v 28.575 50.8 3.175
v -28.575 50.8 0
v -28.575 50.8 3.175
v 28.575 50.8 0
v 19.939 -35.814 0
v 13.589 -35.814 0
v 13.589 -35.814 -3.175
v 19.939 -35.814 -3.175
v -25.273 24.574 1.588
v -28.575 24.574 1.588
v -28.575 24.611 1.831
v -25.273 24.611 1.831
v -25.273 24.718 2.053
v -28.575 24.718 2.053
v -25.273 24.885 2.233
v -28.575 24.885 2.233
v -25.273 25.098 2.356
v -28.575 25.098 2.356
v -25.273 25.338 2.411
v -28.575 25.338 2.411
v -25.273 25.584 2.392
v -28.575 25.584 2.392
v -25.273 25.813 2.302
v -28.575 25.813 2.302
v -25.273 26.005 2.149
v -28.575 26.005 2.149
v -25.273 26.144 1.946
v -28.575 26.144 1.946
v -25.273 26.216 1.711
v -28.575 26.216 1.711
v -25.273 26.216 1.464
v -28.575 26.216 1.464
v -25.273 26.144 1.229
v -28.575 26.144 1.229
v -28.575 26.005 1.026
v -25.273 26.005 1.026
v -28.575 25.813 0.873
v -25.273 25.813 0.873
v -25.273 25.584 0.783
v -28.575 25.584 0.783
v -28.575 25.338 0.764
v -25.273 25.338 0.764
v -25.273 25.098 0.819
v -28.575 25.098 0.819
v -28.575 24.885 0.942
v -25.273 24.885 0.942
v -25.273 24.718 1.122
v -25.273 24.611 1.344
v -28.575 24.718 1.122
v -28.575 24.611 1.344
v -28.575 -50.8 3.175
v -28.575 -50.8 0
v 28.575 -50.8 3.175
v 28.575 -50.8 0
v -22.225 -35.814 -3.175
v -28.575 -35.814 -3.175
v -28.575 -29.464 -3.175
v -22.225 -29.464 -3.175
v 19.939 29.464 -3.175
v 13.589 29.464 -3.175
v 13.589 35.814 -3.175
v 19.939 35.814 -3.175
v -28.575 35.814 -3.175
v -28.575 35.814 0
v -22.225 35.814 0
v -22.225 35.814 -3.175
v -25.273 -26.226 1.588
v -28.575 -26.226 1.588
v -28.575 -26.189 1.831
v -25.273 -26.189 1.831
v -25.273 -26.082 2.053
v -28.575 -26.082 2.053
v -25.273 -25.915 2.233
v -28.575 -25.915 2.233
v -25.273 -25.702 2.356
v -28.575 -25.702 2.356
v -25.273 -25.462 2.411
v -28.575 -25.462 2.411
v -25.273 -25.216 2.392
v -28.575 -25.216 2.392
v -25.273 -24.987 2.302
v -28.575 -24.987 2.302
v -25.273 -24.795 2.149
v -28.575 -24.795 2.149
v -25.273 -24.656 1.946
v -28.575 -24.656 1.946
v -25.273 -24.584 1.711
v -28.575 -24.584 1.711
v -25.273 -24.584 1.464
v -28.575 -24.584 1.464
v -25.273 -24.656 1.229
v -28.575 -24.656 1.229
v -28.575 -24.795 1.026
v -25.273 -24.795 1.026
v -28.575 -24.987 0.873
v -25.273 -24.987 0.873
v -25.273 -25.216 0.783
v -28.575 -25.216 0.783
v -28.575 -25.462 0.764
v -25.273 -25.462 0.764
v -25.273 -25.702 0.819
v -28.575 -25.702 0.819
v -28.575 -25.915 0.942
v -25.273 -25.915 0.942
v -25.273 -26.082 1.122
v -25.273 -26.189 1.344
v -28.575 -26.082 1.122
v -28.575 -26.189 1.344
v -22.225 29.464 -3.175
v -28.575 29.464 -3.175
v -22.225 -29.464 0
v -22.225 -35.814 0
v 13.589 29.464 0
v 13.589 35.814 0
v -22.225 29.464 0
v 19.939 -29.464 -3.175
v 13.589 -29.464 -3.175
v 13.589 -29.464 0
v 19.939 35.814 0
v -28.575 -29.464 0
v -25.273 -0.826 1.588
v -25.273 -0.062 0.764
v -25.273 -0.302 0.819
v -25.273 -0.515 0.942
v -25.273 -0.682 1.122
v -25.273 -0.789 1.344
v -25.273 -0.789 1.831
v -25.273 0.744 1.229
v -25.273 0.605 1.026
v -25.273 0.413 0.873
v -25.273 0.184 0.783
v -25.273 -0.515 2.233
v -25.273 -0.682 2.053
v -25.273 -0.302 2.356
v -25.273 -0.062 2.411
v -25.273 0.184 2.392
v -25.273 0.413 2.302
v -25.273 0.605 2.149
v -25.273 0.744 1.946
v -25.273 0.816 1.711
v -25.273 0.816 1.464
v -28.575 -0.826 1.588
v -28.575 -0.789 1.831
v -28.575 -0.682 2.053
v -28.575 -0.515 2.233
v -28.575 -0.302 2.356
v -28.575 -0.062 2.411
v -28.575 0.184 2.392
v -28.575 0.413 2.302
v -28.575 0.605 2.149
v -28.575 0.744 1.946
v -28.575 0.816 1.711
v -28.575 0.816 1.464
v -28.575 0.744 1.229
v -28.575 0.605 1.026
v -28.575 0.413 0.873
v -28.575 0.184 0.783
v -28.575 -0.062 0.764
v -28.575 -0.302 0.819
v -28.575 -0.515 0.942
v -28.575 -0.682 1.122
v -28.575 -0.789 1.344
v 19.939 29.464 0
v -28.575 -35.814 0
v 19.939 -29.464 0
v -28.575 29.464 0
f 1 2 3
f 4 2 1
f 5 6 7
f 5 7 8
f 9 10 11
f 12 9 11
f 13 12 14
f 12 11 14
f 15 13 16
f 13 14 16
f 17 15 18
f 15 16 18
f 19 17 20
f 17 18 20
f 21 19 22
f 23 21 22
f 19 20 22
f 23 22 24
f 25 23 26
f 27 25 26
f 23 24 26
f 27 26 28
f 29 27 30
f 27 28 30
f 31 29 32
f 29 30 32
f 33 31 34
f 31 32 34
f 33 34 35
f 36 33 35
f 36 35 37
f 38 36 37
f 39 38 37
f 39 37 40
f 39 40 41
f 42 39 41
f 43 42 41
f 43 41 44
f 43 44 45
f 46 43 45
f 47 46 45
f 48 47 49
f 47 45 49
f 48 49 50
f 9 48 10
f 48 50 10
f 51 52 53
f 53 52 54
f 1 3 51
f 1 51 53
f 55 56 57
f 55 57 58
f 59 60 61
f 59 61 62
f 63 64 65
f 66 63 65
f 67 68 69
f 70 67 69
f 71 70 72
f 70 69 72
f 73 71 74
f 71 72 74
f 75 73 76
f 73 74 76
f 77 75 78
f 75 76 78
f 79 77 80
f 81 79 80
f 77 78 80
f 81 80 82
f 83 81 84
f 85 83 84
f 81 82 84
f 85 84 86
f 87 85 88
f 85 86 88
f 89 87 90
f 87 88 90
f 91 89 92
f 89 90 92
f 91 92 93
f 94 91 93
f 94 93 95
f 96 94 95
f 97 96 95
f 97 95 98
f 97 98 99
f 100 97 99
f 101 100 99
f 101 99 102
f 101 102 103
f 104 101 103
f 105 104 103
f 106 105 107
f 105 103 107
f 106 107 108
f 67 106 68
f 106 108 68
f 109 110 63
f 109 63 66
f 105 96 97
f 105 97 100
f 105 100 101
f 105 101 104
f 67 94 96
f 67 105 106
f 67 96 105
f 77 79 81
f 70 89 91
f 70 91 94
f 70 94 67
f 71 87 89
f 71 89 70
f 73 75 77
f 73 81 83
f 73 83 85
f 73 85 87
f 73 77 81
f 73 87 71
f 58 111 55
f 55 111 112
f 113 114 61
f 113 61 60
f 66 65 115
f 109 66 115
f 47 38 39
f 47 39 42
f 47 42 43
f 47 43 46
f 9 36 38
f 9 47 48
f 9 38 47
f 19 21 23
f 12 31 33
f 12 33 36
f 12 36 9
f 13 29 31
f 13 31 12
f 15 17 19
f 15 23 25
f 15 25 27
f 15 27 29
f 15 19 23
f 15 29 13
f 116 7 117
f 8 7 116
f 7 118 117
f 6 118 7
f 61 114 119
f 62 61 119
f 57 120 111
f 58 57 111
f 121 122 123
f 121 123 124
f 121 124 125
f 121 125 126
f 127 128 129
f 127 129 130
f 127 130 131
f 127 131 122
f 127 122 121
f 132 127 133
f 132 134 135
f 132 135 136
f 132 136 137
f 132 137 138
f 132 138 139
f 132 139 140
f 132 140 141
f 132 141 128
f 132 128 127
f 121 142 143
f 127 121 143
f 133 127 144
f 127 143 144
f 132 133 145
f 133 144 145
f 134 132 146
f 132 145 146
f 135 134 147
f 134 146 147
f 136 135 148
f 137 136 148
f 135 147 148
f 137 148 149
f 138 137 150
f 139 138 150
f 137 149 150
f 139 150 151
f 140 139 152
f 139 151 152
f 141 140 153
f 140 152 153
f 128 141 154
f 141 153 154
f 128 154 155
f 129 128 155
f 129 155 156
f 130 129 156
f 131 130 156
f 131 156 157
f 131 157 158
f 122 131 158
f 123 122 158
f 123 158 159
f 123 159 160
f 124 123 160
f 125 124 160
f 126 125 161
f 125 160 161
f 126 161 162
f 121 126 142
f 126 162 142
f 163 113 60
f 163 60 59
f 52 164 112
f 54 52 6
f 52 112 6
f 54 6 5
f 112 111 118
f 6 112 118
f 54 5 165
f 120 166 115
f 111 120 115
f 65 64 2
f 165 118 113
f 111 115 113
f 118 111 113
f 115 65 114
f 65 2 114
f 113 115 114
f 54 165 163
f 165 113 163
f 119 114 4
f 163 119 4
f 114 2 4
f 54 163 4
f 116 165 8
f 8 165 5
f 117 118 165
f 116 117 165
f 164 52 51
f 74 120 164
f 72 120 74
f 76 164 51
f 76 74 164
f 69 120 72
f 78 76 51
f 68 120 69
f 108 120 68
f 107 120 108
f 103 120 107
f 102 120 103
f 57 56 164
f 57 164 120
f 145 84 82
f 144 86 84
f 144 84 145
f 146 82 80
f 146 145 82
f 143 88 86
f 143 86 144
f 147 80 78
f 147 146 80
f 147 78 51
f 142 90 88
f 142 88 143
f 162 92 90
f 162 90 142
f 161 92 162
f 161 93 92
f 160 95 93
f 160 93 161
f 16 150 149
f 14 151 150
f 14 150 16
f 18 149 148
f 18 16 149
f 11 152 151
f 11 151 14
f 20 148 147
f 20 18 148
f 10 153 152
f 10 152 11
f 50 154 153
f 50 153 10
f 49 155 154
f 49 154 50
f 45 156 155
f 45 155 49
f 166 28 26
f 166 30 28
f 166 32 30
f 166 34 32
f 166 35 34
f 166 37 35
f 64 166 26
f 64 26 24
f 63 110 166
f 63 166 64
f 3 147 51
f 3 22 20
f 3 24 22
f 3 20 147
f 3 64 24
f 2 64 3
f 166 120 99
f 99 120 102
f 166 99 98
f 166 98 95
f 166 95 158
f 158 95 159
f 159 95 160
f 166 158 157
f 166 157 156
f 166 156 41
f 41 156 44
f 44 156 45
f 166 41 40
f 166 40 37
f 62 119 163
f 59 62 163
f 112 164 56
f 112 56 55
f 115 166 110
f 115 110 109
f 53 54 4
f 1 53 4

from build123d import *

# Parameters (mm, degrees)
F0_W     = 57.15
F0_H     = 101.6
F1_DEPTH = 3.175
F2_R     = 0.8255
F3_DEPTH = 3.302
F4_W     = 6.35
F4_H     = 6.35
F5_DEPTH = 3.175


with BuildPart() as f1:
    # F0 (on Top) → F1 (new body)
    with BuildSketch(Plane.XY):
        Rectangle(F0_W, F0_H)
    extrude(amount=F1_DEPTH)

    # F2 (on face) → F3 (cut)
    with BuildSketch(Plane(origin=(-28.575, 0, 0), x_dir=(0, -1, 0), z_dir=(-1, 0, 0))):
        with Locations((0, 1.5875)):
            Circle(F2_R)
        with Locations((25.4, 1.5875)):
            Circle(F2_R)
        with Locations((-25.4, 1.5875)):
            Circle(F2_R)
    extrude(amount=-F3_DEPTH, mode=Mode.SUBTRACT)

    # F4 (on face) → F5 (join)
    with BuildSketch(Plane(origin=(0, 0, 0), x_dir=(1, 0, 0), z_dir=(0, 0, -1))):
        with Locations((-25.4, 32.639)):
            Rectangle(F4_W, F4_H)
        with Locations((-25.4, -32.639)):
            Rectangle(F4_W, F4_H)
        with Locations((16.764, -32.639)):
            Rectangle(F4_W, F4_H)
        with Locations((16.764, 32.639)):
            Rectangle(F4_W, F4_H)
    extrude(amount=F5_DEPTH)


solid = f1.part
